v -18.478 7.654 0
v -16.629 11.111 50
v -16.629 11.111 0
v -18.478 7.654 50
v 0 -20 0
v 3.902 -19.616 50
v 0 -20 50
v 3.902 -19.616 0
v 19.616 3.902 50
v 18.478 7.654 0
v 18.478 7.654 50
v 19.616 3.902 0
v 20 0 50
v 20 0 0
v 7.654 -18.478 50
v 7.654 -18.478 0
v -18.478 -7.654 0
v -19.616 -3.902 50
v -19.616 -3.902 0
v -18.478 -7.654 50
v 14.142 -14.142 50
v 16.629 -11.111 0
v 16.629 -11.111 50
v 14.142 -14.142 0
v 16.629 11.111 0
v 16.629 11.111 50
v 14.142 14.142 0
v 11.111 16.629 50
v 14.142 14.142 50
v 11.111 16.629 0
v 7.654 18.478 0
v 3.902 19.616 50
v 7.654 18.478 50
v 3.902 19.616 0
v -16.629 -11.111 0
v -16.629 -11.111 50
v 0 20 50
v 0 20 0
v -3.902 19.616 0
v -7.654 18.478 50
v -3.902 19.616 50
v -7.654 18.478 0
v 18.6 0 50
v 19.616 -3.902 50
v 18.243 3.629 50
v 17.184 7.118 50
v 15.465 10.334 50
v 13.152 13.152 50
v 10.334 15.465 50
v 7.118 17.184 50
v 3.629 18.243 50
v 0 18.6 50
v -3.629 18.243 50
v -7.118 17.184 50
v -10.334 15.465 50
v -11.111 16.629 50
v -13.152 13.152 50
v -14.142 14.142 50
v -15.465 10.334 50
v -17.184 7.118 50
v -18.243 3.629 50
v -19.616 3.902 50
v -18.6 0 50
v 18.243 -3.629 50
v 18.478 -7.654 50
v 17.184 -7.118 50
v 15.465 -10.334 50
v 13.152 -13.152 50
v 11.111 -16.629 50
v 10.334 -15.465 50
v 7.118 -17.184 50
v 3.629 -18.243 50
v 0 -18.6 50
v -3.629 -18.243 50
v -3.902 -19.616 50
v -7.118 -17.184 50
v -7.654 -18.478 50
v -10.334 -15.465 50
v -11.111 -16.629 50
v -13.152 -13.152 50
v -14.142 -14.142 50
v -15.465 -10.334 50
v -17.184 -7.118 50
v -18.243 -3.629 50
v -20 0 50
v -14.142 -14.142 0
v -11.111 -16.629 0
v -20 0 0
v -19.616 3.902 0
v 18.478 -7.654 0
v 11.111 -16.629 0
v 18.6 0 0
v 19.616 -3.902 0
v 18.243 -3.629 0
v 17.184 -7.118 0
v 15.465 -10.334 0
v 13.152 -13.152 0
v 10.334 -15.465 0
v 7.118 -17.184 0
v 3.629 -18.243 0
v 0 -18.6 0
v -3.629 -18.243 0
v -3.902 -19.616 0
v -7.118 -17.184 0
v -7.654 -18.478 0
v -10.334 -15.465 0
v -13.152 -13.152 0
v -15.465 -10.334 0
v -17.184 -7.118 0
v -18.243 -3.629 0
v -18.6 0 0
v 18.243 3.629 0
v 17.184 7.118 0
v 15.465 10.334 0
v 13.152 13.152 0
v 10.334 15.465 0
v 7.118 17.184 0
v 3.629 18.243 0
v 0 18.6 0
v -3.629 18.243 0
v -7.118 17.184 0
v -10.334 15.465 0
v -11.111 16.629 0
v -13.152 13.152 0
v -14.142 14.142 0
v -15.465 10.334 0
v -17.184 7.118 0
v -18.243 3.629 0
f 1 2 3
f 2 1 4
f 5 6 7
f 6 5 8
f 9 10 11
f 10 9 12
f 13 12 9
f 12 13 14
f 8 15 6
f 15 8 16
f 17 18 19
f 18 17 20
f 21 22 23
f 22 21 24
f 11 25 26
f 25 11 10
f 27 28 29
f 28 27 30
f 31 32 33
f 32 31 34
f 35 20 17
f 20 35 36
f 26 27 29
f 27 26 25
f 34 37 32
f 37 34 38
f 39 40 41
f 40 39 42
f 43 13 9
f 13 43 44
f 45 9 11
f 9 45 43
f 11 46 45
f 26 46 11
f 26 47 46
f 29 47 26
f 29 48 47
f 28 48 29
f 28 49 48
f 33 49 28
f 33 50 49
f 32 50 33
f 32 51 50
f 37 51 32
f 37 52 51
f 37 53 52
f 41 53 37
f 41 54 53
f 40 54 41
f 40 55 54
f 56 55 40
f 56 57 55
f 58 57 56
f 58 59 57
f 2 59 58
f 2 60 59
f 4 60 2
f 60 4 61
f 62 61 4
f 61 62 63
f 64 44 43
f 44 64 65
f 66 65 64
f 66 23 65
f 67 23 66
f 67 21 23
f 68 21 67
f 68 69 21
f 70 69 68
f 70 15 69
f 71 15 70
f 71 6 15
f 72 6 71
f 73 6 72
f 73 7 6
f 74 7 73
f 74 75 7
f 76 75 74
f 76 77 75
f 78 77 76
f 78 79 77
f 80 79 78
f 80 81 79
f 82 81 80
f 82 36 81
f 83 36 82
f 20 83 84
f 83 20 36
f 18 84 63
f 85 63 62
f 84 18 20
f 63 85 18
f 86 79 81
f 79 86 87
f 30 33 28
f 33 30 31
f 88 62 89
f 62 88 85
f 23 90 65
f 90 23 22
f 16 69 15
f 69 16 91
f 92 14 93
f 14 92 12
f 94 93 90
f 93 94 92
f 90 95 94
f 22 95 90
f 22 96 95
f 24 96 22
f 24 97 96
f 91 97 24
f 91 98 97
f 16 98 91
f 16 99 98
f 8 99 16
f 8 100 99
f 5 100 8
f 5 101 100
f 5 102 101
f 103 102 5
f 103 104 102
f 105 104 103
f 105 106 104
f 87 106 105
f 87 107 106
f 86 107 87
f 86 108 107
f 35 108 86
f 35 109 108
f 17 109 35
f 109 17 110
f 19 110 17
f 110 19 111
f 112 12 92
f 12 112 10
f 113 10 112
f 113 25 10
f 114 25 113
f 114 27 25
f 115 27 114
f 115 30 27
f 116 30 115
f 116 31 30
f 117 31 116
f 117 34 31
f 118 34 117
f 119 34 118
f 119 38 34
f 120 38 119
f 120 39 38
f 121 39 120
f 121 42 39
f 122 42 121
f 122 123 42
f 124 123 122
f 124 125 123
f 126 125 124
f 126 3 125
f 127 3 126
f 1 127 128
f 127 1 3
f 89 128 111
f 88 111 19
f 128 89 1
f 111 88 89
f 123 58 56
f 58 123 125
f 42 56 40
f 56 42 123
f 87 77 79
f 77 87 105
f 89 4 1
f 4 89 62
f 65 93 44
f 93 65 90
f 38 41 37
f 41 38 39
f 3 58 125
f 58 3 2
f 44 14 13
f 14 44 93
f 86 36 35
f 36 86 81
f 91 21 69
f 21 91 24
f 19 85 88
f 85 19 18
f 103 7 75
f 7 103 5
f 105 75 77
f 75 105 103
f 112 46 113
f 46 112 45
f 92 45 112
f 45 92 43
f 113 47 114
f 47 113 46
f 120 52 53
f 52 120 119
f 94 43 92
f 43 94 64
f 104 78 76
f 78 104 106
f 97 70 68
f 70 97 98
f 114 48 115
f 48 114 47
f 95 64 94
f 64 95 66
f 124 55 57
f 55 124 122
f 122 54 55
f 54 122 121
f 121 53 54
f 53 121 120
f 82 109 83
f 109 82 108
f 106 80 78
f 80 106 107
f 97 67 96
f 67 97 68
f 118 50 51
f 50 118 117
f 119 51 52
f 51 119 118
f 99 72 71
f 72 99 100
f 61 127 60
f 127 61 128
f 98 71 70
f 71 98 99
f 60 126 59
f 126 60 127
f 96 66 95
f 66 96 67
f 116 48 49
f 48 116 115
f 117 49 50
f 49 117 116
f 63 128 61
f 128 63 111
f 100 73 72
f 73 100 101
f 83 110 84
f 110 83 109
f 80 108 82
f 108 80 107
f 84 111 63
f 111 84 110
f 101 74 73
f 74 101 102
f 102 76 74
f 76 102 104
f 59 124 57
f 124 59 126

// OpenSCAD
$fn = 32;

// ----------------------------------------------------------------------
// Thin tube: 1.4 mm wall
// ----------------------------------------------------------------------

// --- parameters (mm) ---
tube_od = 40;             // outer diameter
tube_h = 50;              // height, Z
wall = 1.4;               // wall thickness

difference() {
  cylinder(h = tube_h, d = tube_od);
  translate([0, 0, -1]) cylinder(h = tube_h + 2, d = tube_od - 2 * wall);
}
